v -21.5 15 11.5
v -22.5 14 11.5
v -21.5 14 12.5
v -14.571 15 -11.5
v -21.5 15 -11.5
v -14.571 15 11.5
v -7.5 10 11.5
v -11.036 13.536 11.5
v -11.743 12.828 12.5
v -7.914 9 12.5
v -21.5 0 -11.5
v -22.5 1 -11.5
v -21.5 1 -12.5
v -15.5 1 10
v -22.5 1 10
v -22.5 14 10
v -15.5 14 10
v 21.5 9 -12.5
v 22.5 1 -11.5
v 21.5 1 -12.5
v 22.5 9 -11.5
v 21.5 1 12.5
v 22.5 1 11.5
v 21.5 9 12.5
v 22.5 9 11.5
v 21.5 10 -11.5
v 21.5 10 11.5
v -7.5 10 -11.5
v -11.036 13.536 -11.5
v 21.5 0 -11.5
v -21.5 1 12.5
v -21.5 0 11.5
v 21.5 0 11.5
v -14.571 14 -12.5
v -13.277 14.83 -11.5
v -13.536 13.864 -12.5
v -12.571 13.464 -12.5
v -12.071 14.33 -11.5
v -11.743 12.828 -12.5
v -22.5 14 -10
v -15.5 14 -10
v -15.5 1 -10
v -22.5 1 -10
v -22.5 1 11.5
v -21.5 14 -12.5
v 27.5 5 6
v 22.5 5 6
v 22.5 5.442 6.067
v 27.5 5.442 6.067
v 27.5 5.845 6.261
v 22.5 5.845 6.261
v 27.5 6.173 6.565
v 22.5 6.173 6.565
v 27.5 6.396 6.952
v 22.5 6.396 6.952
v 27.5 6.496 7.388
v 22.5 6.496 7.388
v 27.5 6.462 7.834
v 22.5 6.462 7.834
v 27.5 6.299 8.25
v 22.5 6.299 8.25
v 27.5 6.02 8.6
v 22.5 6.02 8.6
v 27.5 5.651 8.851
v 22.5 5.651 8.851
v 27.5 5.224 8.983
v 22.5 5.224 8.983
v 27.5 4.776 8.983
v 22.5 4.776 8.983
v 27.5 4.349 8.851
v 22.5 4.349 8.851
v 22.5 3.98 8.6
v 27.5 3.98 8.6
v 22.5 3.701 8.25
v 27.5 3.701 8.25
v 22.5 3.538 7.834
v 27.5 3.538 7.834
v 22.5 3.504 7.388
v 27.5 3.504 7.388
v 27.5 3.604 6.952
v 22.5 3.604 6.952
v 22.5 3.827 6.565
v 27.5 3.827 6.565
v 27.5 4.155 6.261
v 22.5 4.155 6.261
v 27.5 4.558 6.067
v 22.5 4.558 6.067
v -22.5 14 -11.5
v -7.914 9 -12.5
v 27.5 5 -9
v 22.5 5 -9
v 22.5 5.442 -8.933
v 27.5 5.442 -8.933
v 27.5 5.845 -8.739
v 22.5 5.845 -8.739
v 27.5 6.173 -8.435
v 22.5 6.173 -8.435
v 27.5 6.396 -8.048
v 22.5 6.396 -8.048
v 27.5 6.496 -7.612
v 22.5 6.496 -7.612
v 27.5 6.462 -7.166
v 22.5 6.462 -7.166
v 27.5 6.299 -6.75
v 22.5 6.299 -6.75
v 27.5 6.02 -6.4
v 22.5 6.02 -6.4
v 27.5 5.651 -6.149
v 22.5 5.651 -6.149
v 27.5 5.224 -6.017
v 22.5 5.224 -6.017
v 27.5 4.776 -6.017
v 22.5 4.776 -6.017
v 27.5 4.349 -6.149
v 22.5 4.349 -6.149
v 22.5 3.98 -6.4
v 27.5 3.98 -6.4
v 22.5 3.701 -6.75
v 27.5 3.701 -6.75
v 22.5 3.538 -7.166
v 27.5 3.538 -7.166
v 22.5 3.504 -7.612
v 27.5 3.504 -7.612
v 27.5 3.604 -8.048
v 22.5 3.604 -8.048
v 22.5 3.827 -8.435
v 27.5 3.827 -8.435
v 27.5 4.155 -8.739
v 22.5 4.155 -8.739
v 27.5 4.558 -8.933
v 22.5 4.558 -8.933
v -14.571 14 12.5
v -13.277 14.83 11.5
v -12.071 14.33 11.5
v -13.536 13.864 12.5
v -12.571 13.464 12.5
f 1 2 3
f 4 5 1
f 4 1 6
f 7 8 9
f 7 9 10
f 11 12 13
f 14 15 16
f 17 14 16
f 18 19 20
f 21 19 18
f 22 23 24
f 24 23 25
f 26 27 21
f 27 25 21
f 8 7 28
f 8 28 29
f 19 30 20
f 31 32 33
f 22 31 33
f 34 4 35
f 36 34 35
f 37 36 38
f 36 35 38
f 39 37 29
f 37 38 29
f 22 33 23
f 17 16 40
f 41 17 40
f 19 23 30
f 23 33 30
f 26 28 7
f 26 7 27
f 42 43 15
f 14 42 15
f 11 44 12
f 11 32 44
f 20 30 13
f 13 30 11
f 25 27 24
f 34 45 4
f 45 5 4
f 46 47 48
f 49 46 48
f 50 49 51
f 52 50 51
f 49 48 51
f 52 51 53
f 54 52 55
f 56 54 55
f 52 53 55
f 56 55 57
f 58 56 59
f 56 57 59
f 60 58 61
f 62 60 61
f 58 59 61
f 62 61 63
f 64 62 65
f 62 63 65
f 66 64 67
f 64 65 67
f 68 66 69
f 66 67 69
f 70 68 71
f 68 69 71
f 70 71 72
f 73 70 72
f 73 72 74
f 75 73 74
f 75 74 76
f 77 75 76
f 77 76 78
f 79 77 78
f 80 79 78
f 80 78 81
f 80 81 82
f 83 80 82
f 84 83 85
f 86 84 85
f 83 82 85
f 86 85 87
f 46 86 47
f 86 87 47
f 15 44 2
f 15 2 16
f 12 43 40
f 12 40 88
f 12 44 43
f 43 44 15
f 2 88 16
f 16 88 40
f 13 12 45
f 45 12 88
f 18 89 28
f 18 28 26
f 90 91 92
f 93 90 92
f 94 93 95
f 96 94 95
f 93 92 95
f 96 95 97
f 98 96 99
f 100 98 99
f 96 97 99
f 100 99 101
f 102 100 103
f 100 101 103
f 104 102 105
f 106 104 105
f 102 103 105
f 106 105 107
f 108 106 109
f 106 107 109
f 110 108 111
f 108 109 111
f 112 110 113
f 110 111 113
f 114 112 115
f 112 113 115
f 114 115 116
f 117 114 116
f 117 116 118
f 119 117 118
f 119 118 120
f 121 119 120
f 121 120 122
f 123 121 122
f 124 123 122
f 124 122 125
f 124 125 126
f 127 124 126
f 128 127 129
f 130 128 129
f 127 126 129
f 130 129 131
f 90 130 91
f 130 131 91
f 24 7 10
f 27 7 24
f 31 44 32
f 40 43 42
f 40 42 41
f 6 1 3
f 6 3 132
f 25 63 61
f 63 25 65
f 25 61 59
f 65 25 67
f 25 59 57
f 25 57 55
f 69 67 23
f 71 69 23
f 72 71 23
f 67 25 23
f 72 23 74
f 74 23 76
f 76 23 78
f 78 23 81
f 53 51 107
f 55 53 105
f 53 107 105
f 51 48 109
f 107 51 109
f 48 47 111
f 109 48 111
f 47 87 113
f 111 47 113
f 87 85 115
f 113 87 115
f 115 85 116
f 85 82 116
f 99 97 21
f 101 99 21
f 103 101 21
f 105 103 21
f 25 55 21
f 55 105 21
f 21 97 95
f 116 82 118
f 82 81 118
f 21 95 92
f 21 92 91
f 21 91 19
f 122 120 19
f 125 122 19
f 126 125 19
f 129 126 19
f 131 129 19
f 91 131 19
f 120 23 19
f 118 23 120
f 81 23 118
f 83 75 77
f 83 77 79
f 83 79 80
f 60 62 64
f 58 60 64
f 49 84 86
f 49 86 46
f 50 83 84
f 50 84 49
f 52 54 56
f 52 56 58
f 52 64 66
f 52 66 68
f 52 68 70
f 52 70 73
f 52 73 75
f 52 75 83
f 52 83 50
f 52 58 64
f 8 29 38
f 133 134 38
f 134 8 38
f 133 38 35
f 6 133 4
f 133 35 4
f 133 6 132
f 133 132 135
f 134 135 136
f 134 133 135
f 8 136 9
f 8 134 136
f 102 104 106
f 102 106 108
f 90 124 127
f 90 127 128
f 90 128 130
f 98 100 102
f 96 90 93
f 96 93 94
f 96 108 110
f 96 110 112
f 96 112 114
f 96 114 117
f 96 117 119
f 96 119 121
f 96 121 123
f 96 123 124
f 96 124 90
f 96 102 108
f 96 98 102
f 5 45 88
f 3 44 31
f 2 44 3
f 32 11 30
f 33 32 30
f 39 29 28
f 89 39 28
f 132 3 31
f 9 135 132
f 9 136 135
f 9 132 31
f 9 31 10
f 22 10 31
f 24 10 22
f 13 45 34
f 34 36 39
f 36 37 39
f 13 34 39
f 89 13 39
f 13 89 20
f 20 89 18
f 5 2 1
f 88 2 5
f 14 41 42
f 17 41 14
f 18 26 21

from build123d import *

# Parameters (mm, degrees)
SKETCH_1_W          = 35
SKETCH_1_H          = 25
EXTRUDE_1_DEPTH     = 10
SKETCH_1_4_W        = 10
SKETCH_1_4_H        = 25
EXTRUDE_2_DEPTH     = 15
SKETCH_2_W          = 10
SKETCH_2_H          = 13
CUT_EXTRUDE_1_DEPTH = 7
EXTRUDE_3_DEPTH     = 25
FILLET_1_R          = 5
CHAMFER_1_SIZE      = 1
SKETCH_5_R          = 1.5
EXTRUDE_4_DEPTH     = 5


with BuildPart() as part:
    # 草图1 → 凸台-拉伸1 (new body)
    with BuildSketch(Plane(origin=(0, 0, 0), x_dir=(1, 0, 0), z_dir=(0, 1, 0))):
        with Locations((5, 0)):
            Rectangle(SKETCH_1_W, SKETCH_1_H)
    extrude(amount=EXTRUDE_1_DEPTH)

    # 草图1<4> → 凸台-拉伸2 (add)
    with BuildSketch(Plane(origin=(0, 0, 0), x_dir=(1, 0, 0), z_dir=(0, 1, 0))):
        with Locations((-17.5, 0)):
            Rectangle(SKETCH_1_4_W, SKETCH_1_4_H)
    extrude(amount=EXTRUDE_2_DEPTH)

    # 草图2 → 切除-拉伸1 (cut)
    with BuildSketch(Plane.ZY.offset(22.5)):
        with Locations((5, 7.5)):
            Rectangle(SKETCH_2_W, SKETCH_2_H)
        with Locations((-5, 7.5)):
            Rectangle(SKETCH_2_W, SKETCH_2_H)
    extrude(amount=-CUT_EXTRUDE_1_DEPTH, mode=Mode.SUBTRACT)

    # 草图3 → 凸台-拉伸3 (add, through all)
    with BuildSketch(Plane.XY.offset(12.5)):
        Polygon((-7.5, 10), (-12.5, 15), (-12.5, 12.5), (-12.5, 10), (-10, 10), align=None)
    extrude(amount=-EXTRUDE_3_DEPTH)

    # 圆角1
    fillet_1_edges = [part.edges().sort_by_distance(p)[0] for p in [
        (-12.5, 15, 0),
    ]]
    fillet(fillet_1_edges, radius=FILLET_1_R)

    # 倒角1
    chamfer_1_edges = [part.edges().sort_by_distance(p)[0] for p in [
        (-18.535533906, 15, -12.5),
        (-22.5, 0, 0),
        (-22.5, 7.5, -12.5),
        (-22.5, 7.5, 12.5),
        (-22.5, 15, 0),
        (-18.535533906, 15, 12.5),
        (22.5, 10, 0),
        (7.5, 10, -12.5),
        (7.5, 10, 12.5),
        (-9.267766953, 11.767766953, 12.5),
        (-9.267766953, 11.767766953, -12.5),
        (22.5, 0, 0),
        (-12.65765065, 14.619397663, 12.5),
        (-12.65765065, 14.619397663, -12.5),
        (0, 0, 12.5),
        (0, 0, -12.5),
        (22.5, 5, -12.5),
        (22.5, 5, 12.5),
    ]]
    chamfer(chamfer_1_edges, length=CHAMFER_1_SIZE - 0.0001)  # a hair under: the kernel refuses the full size

    # 草图5 → 凸台-拉伸4 (add)
    with BuildSketch(Plane(origin=(22.5, 0, 0), x_dir=(0, 0, -1), z_dir=(1, 0, 0))):
        with Locations((-7.5, 5)):
            Circle(SKETCH_5_R)
        with Locations((7.5, 5)):
            Circle(SKETCH_5_R)
    extrude(amount=EXTRUDE_4_DEPTH)


solid = part.part
